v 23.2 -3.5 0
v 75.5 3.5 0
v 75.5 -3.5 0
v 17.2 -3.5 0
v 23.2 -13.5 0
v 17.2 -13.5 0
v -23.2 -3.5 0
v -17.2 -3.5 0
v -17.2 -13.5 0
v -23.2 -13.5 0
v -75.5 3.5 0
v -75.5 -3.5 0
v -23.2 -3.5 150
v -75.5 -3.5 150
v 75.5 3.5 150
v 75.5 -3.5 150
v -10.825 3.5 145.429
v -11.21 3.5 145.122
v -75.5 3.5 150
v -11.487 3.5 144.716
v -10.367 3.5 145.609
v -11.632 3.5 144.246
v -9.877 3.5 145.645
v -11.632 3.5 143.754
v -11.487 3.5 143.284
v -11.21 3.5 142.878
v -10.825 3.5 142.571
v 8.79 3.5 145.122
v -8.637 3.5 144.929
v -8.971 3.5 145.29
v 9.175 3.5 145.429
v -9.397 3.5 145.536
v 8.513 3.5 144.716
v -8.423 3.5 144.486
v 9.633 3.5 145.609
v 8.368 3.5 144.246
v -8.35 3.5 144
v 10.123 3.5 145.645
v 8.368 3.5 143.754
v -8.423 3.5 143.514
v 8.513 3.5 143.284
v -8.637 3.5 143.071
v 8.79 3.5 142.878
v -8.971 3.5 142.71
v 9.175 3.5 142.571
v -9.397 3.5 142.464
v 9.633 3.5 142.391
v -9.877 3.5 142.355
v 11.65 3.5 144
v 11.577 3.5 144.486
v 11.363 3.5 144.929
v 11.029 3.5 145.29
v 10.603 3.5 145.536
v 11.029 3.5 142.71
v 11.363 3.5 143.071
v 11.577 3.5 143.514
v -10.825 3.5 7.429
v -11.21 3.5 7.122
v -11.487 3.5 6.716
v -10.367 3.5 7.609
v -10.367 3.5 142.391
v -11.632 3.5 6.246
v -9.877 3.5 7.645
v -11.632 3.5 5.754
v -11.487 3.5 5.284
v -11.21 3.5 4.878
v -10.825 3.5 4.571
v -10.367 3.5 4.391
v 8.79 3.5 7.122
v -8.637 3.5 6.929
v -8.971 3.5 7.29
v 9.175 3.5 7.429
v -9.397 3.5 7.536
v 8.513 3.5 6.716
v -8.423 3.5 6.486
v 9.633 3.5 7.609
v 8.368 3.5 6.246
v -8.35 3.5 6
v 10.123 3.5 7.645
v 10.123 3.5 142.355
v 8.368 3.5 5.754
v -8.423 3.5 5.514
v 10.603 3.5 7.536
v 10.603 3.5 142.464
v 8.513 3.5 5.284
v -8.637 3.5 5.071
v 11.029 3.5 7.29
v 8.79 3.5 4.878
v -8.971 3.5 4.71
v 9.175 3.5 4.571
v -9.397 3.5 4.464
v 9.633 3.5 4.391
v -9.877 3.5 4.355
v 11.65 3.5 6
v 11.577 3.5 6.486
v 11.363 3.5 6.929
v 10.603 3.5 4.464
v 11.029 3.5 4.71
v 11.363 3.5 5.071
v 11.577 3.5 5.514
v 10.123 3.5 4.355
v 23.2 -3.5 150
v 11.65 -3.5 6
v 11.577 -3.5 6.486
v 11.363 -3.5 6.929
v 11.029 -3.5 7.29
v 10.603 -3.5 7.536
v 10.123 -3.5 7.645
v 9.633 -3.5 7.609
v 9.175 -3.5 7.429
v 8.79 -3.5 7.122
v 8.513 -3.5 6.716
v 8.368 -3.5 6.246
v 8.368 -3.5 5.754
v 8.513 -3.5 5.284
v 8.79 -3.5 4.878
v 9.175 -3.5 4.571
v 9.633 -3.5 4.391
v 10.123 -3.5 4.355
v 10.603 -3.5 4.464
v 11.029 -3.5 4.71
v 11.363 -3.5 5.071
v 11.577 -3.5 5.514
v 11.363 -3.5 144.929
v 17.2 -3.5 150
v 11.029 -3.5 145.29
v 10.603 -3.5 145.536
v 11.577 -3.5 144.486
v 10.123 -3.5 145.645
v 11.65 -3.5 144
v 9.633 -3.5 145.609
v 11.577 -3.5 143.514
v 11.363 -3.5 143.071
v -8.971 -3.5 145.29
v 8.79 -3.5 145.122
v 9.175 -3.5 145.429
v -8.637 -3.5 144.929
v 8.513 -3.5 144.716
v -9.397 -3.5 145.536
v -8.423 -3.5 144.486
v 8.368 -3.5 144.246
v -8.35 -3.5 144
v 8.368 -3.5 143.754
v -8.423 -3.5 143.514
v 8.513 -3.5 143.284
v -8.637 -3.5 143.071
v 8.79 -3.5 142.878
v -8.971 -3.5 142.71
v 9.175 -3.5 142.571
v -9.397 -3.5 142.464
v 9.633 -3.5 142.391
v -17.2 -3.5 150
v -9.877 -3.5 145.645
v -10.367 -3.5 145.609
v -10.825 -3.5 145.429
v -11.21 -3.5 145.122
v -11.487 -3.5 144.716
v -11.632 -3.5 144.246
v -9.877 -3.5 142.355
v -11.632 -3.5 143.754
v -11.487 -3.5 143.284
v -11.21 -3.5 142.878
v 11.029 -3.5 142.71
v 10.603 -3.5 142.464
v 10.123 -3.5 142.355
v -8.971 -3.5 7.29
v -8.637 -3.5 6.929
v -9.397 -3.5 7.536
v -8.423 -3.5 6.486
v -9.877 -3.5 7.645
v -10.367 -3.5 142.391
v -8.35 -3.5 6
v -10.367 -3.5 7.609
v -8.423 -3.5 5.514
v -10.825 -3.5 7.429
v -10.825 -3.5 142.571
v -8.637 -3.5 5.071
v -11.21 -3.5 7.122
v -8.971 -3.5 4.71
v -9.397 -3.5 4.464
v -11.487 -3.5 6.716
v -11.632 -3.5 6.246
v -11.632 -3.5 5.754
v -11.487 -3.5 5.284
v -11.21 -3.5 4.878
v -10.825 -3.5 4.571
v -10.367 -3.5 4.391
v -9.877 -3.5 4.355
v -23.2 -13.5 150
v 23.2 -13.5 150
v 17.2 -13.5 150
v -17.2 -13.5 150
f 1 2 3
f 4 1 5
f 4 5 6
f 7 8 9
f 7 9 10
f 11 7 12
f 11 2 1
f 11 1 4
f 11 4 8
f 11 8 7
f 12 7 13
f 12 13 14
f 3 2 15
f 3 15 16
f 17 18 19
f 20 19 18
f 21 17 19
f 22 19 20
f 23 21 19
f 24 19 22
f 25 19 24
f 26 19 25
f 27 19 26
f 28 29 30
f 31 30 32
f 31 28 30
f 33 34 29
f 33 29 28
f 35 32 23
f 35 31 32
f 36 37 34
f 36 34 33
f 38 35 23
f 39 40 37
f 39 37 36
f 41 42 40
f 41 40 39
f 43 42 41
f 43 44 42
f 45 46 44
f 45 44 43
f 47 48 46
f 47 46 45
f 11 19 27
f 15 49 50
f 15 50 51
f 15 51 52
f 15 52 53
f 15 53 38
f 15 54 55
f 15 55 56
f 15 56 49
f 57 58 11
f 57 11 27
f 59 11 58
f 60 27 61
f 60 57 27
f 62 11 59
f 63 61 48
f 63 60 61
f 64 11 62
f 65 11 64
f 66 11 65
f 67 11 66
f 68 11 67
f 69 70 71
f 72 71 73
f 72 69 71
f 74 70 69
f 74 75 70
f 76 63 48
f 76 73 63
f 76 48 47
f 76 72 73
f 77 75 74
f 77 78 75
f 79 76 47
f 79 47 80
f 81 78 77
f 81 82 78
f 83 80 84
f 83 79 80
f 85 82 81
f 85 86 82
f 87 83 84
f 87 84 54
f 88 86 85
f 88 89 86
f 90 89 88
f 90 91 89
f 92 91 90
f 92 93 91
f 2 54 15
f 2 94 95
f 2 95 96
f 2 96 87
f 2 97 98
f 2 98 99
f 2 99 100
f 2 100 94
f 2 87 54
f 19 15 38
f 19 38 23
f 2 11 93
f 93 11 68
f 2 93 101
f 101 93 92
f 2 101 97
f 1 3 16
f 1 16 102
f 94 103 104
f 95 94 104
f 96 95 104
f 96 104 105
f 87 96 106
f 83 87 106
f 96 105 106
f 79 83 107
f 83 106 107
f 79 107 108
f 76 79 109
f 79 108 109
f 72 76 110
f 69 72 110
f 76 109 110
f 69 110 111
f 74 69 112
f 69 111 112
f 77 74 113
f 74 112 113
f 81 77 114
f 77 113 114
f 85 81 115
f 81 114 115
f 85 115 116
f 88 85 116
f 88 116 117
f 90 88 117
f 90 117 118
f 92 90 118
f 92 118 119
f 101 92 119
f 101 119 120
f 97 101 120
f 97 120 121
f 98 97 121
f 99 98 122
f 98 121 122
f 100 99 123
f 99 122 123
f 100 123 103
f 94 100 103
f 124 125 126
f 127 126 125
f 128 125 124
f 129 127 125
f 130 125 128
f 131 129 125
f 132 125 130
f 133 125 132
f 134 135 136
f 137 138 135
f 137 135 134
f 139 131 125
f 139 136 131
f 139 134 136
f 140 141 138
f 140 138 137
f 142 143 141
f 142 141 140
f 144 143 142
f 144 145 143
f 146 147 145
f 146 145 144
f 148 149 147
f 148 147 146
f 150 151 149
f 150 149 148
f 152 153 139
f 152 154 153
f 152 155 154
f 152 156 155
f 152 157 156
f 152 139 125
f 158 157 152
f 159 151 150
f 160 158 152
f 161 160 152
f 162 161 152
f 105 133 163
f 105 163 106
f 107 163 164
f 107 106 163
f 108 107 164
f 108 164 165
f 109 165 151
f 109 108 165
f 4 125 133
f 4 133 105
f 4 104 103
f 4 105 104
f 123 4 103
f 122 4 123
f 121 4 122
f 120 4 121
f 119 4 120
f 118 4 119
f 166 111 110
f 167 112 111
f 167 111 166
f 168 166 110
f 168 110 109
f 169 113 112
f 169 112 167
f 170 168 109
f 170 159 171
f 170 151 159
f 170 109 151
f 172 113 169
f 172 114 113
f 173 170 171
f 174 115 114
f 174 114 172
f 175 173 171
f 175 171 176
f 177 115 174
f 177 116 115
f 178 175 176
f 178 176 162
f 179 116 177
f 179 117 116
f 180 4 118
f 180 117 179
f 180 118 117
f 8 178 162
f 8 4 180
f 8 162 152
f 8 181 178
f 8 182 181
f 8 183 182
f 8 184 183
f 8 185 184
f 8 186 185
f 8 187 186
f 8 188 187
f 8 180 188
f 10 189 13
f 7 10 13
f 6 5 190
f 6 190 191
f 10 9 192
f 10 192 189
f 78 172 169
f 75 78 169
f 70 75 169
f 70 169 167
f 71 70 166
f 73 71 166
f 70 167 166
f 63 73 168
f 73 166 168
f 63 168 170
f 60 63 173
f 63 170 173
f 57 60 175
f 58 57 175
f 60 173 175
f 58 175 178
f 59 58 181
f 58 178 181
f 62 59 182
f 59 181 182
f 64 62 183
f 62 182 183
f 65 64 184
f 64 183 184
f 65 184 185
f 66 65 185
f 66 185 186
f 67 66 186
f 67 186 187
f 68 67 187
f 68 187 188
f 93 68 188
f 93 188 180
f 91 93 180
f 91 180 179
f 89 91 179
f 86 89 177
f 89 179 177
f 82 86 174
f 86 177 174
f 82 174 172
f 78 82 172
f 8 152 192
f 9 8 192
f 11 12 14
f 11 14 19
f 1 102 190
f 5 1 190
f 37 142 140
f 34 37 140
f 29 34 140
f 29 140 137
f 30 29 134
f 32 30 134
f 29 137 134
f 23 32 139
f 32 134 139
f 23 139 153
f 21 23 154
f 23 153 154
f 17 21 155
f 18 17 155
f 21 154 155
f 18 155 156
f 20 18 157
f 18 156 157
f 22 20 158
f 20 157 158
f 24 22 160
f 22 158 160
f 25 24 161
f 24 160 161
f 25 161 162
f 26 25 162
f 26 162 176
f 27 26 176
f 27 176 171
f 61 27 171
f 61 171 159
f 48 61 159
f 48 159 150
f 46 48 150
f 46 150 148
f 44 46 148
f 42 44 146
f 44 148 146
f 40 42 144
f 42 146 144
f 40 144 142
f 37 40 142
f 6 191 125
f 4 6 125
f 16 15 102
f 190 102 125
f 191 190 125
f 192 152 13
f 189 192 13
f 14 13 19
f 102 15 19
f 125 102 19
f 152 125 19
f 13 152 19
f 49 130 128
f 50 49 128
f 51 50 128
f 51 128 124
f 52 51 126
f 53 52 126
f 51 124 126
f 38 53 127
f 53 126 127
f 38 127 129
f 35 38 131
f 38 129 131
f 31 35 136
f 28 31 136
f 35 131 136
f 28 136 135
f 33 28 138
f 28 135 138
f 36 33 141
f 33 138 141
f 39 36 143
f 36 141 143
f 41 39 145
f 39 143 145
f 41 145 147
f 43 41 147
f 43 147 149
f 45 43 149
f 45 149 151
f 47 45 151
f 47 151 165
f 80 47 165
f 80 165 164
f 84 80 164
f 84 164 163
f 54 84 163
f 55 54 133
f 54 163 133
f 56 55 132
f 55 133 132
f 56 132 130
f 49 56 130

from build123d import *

# Parameters (mm, degrees)
BOSS_EXTRUDE1_DEPTH = 150
SKETCH4_R           = 1.65
CUT_EXTRUDE1_DEPTH  = 7


with BuildPart() as part:
    # Sketch1 → Boss-Extrude1 (new body)
    with BuildSketch(Plane.XY):
        Polygon((-75.5, 3.5), (75.5, 3.5), (75.5, -3.5), (23.2, -3.5), (23.2, -13.5), (17.2, -13.5), (17.2, -3.5), (-17.2, -3.5), (-17.2, -13.5), (-23.2, -13.5), (-23.2, -3.5), (-75.5, -3.5), align=None)
    extrude(amount=BOSS_EXTRUDE1_DEPTH)

    # Sketch4 → Cut-Extrude1 (cut)
    with BuildSketch(Plane.XZ.offset(3.5)):
        with Locations((-10, 6)):
            Circle(SKETCH4_R)
        with Locations((10, 6)):
            Circle(SKETCH4_R)
        with Locations((-10, 144)):
            Circle(SKETCH4_R)
        with Locations((10, 144)):
            Circle(SKETCH4_R)
    extrude(amount=-CUT_EXTRUDE1_DEPTH, mode=Mode.SUBTRACT)


solid = part.part
